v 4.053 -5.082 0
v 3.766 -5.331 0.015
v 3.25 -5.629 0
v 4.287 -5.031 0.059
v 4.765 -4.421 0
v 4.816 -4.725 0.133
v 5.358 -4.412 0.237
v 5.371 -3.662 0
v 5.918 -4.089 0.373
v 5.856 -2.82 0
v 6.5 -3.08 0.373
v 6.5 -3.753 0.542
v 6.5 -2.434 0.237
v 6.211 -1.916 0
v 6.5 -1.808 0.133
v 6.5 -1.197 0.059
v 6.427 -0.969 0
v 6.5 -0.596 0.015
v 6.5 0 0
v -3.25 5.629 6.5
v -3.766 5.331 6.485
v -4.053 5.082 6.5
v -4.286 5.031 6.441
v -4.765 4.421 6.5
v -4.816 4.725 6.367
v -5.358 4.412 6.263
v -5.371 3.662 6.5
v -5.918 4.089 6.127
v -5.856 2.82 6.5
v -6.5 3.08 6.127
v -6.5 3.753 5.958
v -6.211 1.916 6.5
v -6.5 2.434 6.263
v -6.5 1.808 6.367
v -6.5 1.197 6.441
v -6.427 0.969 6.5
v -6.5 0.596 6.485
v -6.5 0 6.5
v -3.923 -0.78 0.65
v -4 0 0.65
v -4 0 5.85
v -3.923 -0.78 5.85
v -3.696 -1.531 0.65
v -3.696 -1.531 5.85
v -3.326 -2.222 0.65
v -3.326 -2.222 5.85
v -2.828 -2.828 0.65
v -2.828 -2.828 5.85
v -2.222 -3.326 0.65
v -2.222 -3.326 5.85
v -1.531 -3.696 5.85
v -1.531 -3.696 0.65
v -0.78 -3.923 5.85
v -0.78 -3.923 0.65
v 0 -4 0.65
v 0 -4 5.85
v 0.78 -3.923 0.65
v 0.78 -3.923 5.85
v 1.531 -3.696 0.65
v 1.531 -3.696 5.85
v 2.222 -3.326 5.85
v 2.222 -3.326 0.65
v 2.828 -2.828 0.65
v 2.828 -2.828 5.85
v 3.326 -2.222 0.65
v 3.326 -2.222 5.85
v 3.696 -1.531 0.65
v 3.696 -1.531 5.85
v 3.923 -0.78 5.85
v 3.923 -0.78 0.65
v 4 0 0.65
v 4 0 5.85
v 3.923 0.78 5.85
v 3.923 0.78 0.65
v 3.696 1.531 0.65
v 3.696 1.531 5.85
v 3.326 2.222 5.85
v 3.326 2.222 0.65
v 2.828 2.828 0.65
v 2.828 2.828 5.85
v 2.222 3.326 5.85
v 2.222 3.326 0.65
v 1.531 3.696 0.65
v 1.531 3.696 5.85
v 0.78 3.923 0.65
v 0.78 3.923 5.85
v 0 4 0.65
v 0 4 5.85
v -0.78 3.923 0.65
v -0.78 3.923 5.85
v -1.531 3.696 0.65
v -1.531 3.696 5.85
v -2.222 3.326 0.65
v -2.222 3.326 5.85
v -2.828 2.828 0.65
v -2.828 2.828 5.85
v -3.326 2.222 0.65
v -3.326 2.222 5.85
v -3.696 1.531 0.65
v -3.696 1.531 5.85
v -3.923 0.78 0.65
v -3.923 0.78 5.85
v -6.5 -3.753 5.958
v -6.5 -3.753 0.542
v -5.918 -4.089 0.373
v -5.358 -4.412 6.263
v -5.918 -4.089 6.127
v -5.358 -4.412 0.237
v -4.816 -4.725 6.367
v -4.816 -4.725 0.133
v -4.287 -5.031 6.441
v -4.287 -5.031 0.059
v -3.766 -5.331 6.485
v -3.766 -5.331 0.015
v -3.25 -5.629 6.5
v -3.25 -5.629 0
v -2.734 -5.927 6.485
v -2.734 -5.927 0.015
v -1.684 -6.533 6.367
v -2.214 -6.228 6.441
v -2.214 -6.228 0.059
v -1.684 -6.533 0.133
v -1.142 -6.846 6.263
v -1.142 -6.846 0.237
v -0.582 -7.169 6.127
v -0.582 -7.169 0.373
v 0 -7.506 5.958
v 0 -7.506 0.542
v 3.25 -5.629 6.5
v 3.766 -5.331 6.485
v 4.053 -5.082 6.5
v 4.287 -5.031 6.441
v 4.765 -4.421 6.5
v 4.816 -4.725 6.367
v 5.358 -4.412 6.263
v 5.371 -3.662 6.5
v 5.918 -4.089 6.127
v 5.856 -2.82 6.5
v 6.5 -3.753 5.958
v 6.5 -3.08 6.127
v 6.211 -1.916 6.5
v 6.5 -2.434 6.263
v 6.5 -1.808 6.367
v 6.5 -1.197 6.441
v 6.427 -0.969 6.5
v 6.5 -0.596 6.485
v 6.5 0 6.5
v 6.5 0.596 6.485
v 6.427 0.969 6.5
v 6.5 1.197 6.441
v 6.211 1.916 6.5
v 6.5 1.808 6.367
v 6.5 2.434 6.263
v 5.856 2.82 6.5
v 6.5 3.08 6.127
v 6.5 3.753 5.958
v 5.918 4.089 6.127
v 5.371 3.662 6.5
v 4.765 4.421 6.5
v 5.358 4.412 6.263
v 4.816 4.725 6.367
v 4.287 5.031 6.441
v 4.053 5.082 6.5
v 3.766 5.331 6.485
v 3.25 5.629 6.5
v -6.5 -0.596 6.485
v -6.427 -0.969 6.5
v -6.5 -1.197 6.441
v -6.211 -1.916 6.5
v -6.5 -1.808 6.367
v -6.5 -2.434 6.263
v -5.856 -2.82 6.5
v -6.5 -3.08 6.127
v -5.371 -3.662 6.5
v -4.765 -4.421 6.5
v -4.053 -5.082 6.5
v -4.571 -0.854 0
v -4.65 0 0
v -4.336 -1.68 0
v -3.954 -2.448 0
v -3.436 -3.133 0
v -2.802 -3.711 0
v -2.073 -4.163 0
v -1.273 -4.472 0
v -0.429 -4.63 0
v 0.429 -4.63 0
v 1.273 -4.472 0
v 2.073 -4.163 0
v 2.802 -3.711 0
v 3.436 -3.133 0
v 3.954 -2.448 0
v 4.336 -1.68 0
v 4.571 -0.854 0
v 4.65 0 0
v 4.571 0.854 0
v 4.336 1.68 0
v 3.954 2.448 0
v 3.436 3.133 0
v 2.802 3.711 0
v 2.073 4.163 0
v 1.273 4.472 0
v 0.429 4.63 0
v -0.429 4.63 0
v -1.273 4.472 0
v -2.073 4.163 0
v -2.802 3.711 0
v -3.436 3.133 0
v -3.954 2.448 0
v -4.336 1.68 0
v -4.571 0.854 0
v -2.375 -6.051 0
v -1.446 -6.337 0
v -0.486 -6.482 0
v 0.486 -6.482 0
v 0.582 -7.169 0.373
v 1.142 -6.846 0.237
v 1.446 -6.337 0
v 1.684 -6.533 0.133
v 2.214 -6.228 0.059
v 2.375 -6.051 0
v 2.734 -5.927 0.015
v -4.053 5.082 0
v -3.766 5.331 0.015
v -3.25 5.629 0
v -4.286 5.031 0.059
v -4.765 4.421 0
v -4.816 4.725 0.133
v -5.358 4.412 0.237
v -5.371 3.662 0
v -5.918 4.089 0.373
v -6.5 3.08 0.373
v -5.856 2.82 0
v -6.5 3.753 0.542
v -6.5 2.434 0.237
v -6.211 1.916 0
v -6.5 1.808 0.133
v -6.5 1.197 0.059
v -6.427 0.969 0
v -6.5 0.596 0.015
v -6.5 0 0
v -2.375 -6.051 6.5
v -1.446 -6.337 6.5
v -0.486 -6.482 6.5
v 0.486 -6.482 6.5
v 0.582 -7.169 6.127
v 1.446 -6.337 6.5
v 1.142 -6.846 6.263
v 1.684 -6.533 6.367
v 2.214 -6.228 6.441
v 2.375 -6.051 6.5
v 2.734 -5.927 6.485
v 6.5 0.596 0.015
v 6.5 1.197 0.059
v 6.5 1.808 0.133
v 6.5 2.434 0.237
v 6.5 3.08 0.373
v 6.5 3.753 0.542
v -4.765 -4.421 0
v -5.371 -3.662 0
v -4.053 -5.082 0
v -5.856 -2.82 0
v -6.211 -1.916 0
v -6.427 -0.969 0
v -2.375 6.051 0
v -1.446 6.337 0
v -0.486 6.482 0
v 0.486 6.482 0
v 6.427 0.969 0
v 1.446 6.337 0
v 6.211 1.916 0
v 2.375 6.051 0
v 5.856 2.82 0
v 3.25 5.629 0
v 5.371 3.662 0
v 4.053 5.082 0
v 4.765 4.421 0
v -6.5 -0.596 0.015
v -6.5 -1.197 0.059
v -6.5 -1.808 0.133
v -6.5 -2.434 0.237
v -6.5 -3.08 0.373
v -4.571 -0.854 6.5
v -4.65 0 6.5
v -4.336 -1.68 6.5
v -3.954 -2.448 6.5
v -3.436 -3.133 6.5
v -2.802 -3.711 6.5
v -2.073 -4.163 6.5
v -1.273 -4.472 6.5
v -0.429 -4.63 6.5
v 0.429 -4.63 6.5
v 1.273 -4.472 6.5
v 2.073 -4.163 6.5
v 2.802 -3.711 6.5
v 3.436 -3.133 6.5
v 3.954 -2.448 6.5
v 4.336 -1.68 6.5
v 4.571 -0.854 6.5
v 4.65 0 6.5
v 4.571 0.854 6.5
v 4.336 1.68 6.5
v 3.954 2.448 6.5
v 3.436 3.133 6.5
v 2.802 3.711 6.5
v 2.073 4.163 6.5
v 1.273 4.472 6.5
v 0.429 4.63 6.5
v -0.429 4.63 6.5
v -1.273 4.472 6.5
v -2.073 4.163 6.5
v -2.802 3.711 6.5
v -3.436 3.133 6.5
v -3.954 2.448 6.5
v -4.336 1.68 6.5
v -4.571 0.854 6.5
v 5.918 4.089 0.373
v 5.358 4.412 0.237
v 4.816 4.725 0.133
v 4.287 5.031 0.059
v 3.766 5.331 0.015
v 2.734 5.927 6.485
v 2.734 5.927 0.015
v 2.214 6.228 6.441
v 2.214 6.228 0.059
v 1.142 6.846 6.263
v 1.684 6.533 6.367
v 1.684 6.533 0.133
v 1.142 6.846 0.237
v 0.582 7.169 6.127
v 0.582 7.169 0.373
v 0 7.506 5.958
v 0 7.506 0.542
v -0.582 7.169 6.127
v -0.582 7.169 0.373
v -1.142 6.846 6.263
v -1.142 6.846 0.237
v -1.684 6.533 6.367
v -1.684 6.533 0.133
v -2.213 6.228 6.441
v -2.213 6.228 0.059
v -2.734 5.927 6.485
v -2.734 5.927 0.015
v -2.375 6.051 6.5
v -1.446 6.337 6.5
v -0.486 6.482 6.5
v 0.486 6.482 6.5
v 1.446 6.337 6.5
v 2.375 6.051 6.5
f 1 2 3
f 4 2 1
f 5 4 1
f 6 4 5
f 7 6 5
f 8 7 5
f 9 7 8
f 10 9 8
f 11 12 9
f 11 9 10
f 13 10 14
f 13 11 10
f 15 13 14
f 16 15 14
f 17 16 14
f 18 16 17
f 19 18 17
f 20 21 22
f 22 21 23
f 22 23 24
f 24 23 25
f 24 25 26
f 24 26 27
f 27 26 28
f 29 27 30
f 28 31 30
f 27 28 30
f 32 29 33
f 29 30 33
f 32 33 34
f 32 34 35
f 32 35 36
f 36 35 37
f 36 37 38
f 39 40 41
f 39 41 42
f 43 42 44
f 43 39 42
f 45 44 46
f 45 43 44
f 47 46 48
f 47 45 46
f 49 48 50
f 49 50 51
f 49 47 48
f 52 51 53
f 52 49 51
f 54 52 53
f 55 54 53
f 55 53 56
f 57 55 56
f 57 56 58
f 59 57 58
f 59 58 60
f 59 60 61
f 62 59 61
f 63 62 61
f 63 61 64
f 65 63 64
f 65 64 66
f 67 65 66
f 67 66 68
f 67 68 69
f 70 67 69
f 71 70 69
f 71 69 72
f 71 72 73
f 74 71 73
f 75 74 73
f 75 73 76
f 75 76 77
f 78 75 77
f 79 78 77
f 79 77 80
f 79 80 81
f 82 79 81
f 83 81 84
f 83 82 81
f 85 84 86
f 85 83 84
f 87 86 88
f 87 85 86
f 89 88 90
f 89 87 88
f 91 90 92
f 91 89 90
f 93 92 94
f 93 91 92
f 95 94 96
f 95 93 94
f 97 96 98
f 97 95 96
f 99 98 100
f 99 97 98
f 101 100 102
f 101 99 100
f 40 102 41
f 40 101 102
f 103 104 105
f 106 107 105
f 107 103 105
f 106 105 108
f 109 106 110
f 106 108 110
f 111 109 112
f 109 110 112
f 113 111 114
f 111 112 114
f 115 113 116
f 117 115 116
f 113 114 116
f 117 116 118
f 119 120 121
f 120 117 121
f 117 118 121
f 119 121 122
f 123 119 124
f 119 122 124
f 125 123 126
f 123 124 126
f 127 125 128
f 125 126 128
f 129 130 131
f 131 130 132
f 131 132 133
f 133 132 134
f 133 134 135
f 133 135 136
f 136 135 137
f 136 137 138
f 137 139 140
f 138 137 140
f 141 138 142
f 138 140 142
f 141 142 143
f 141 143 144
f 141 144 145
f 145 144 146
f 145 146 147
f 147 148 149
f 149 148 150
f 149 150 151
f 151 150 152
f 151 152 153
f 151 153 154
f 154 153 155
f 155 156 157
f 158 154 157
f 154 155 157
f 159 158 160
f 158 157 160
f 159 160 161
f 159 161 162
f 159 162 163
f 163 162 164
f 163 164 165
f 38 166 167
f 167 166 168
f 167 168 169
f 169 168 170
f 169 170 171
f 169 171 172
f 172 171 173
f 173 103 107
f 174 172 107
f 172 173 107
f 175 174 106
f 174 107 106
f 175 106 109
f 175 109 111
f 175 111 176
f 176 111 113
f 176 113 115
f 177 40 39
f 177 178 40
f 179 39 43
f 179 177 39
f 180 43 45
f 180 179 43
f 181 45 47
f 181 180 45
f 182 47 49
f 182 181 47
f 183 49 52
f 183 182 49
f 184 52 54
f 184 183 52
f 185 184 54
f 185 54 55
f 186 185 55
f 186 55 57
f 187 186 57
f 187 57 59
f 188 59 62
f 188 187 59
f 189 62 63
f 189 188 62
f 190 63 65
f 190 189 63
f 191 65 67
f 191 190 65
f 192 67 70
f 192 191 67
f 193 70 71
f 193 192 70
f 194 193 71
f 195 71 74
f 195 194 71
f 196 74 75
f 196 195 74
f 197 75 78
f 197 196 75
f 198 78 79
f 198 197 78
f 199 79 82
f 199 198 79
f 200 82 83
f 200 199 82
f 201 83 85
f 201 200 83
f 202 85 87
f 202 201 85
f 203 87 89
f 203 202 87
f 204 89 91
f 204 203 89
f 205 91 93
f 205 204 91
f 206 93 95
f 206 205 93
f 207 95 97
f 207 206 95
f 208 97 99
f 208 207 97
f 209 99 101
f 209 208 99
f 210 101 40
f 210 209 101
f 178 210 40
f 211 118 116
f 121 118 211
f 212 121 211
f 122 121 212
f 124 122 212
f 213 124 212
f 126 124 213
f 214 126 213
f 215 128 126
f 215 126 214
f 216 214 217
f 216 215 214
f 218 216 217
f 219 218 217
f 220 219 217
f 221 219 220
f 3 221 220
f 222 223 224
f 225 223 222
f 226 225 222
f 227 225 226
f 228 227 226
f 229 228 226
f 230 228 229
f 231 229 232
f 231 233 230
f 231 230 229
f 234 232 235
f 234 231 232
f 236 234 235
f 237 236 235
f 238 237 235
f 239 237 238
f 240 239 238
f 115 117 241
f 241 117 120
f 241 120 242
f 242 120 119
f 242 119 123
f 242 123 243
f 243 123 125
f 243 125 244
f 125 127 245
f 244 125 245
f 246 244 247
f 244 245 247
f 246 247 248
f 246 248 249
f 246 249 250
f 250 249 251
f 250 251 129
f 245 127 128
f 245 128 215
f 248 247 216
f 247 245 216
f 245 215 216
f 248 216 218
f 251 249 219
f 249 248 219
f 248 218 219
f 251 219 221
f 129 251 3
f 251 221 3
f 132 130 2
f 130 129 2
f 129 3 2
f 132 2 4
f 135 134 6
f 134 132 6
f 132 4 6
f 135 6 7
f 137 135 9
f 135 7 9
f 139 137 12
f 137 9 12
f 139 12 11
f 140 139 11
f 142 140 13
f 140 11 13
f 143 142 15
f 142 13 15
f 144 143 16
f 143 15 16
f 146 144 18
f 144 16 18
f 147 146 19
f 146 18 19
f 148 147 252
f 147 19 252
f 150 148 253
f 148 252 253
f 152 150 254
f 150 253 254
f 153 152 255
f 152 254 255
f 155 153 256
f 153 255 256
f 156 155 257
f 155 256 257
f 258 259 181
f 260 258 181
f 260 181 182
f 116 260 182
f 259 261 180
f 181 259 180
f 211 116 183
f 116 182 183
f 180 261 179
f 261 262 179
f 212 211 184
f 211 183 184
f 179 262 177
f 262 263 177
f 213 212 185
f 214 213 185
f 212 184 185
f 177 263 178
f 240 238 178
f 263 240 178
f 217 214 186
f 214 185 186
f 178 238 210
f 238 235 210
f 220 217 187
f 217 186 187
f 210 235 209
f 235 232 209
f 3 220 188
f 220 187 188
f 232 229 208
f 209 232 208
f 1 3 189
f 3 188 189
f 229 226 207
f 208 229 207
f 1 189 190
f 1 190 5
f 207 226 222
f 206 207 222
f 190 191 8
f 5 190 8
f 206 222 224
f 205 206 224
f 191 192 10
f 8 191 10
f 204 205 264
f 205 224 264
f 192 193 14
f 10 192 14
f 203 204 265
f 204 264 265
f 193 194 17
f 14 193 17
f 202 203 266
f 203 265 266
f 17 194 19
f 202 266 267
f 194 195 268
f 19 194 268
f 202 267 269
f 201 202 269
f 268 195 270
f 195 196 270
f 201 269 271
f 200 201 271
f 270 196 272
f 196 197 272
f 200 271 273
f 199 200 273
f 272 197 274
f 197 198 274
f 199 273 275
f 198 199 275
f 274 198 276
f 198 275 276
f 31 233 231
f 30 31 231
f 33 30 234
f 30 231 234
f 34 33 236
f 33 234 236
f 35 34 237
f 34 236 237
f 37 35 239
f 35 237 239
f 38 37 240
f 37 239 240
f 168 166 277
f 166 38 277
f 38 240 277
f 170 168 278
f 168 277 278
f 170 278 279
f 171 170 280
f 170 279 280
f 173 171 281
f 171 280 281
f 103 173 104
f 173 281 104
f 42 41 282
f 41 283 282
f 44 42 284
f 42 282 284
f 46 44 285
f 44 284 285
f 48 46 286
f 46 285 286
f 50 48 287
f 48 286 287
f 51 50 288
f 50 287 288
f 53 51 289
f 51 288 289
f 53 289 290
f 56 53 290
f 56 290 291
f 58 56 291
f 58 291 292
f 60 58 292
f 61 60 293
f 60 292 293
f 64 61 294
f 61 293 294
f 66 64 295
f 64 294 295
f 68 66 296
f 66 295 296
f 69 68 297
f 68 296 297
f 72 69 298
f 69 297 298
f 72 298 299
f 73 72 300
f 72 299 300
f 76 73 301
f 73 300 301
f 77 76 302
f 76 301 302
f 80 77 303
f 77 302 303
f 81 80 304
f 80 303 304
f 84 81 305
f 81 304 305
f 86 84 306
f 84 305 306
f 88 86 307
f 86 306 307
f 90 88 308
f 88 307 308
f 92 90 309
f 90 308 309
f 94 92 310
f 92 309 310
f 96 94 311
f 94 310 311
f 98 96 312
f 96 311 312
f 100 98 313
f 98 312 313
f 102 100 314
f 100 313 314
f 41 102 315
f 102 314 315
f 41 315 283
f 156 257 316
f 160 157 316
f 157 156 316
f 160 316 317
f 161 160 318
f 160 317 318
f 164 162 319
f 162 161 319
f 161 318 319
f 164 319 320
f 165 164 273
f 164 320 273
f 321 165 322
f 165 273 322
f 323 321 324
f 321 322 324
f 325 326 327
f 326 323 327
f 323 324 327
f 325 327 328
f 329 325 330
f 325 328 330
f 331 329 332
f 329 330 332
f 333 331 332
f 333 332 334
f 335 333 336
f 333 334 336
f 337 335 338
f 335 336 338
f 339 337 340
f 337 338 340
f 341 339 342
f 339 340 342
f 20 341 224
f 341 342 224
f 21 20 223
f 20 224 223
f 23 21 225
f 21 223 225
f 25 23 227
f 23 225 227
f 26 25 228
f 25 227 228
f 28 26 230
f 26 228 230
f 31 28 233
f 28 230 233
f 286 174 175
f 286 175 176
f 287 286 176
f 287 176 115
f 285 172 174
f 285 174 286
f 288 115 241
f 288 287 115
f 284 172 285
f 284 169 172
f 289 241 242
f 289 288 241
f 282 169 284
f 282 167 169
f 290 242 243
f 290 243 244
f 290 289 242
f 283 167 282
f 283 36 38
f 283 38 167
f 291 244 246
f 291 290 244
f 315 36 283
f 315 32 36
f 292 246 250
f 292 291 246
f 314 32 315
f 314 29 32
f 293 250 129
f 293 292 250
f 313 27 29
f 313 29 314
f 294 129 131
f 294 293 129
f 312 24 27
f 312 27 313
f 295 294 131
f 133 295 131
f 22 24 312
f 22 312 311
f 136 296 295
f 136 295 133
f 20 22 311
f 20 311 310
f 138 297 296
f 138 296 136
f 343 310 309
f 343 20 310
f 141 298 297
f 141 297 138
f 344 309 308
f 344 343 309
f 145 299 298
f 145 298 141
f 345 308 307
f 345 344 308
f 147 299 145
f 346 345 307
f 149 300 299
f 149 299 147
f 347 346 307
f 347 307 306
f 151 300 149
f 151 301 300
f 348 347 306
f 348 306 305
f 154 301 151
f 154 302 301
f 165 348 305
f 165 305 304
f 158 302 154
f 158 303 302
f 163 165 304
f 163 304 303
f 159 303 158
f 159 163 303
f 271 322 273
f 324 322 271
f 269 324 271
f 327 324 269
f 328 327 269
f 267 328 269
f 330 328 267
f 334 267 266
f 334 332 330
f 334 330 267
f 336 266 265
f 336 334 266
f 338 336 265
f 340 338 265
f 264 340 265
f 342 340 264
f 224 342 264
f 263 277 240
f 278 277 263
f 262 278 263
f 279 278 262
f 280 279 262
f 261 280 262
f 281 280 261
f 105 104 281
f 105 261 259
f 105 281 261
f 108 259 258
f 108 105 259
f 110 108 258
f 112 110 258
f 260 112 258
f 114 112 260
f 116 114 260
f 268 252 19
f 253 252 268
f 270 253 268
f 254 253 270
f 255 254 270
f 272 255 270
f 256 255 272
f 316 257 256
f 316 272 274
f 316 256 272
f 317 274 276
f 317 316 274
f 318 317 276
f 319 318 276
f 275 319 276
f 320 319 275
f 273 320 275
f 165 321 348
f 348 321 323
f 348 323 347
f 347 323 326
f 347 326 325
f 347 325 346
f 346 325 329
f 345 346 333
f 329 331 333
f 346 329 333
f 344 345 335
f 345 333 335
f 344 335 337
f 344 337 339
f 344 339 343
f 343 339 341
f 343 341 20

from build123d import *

# Parameters (mm, degrees)
SKETCH1_R           = 4
BOSS_EXTRUDE1_DEPTH = 6.5


with BuildPart() as part:
    # Sketch1 → Boss-Extrude1 (new body)
    with BuildSketch(Plane.XY):
        Polygon((0, -7.505553499), (6.5, -3.75277675), (6.5, 3.75277675), (0, 7.505553499), (-6.5, 3.75277675), (-6.5, -3.75277675), align=None)
        with Locations(Location((0, 0, 0), (0, 0, 180))):
            Circle(SKETCH1_R, mode=Mode.SUBTRACT)
    extrude(amount=BOSS_EXTRUDE1_DEPTH)

    # Sketch2 → Cut-Revolve1 (revolve, cut)
    with BuildSketch(Plane(origin=(0, 0, 0), x_dir=(0, 0, -1), z_dir=(1, 0, 0)), mode=Mode.PRIVATE) as cut_revolve1_sk:
        Polygon((-6.5, 7.505553499), (-6.5, 6.5), (-5.958333333, 7.505553499), align=None)
        Polygon((-0.541666667, 7.505553499), (0, 7.505553499), (0, 6.5), align=None)
        Polygon((-6.5, 4), (-5.85, 4), (-6.5, 4.65), align=None)
        Polygon((0, 4), (-0.65, 4), (0, 4.65), align=None)
    revolve(cut_revolve1_sk.sketch.rotate(Axis((0, 0, 0), (0, 0, 1)), 90), axis=Axis((0, 0, 0), (0, 0, 1)), mode=Mode.SUBTRACT)


solid = part.part
